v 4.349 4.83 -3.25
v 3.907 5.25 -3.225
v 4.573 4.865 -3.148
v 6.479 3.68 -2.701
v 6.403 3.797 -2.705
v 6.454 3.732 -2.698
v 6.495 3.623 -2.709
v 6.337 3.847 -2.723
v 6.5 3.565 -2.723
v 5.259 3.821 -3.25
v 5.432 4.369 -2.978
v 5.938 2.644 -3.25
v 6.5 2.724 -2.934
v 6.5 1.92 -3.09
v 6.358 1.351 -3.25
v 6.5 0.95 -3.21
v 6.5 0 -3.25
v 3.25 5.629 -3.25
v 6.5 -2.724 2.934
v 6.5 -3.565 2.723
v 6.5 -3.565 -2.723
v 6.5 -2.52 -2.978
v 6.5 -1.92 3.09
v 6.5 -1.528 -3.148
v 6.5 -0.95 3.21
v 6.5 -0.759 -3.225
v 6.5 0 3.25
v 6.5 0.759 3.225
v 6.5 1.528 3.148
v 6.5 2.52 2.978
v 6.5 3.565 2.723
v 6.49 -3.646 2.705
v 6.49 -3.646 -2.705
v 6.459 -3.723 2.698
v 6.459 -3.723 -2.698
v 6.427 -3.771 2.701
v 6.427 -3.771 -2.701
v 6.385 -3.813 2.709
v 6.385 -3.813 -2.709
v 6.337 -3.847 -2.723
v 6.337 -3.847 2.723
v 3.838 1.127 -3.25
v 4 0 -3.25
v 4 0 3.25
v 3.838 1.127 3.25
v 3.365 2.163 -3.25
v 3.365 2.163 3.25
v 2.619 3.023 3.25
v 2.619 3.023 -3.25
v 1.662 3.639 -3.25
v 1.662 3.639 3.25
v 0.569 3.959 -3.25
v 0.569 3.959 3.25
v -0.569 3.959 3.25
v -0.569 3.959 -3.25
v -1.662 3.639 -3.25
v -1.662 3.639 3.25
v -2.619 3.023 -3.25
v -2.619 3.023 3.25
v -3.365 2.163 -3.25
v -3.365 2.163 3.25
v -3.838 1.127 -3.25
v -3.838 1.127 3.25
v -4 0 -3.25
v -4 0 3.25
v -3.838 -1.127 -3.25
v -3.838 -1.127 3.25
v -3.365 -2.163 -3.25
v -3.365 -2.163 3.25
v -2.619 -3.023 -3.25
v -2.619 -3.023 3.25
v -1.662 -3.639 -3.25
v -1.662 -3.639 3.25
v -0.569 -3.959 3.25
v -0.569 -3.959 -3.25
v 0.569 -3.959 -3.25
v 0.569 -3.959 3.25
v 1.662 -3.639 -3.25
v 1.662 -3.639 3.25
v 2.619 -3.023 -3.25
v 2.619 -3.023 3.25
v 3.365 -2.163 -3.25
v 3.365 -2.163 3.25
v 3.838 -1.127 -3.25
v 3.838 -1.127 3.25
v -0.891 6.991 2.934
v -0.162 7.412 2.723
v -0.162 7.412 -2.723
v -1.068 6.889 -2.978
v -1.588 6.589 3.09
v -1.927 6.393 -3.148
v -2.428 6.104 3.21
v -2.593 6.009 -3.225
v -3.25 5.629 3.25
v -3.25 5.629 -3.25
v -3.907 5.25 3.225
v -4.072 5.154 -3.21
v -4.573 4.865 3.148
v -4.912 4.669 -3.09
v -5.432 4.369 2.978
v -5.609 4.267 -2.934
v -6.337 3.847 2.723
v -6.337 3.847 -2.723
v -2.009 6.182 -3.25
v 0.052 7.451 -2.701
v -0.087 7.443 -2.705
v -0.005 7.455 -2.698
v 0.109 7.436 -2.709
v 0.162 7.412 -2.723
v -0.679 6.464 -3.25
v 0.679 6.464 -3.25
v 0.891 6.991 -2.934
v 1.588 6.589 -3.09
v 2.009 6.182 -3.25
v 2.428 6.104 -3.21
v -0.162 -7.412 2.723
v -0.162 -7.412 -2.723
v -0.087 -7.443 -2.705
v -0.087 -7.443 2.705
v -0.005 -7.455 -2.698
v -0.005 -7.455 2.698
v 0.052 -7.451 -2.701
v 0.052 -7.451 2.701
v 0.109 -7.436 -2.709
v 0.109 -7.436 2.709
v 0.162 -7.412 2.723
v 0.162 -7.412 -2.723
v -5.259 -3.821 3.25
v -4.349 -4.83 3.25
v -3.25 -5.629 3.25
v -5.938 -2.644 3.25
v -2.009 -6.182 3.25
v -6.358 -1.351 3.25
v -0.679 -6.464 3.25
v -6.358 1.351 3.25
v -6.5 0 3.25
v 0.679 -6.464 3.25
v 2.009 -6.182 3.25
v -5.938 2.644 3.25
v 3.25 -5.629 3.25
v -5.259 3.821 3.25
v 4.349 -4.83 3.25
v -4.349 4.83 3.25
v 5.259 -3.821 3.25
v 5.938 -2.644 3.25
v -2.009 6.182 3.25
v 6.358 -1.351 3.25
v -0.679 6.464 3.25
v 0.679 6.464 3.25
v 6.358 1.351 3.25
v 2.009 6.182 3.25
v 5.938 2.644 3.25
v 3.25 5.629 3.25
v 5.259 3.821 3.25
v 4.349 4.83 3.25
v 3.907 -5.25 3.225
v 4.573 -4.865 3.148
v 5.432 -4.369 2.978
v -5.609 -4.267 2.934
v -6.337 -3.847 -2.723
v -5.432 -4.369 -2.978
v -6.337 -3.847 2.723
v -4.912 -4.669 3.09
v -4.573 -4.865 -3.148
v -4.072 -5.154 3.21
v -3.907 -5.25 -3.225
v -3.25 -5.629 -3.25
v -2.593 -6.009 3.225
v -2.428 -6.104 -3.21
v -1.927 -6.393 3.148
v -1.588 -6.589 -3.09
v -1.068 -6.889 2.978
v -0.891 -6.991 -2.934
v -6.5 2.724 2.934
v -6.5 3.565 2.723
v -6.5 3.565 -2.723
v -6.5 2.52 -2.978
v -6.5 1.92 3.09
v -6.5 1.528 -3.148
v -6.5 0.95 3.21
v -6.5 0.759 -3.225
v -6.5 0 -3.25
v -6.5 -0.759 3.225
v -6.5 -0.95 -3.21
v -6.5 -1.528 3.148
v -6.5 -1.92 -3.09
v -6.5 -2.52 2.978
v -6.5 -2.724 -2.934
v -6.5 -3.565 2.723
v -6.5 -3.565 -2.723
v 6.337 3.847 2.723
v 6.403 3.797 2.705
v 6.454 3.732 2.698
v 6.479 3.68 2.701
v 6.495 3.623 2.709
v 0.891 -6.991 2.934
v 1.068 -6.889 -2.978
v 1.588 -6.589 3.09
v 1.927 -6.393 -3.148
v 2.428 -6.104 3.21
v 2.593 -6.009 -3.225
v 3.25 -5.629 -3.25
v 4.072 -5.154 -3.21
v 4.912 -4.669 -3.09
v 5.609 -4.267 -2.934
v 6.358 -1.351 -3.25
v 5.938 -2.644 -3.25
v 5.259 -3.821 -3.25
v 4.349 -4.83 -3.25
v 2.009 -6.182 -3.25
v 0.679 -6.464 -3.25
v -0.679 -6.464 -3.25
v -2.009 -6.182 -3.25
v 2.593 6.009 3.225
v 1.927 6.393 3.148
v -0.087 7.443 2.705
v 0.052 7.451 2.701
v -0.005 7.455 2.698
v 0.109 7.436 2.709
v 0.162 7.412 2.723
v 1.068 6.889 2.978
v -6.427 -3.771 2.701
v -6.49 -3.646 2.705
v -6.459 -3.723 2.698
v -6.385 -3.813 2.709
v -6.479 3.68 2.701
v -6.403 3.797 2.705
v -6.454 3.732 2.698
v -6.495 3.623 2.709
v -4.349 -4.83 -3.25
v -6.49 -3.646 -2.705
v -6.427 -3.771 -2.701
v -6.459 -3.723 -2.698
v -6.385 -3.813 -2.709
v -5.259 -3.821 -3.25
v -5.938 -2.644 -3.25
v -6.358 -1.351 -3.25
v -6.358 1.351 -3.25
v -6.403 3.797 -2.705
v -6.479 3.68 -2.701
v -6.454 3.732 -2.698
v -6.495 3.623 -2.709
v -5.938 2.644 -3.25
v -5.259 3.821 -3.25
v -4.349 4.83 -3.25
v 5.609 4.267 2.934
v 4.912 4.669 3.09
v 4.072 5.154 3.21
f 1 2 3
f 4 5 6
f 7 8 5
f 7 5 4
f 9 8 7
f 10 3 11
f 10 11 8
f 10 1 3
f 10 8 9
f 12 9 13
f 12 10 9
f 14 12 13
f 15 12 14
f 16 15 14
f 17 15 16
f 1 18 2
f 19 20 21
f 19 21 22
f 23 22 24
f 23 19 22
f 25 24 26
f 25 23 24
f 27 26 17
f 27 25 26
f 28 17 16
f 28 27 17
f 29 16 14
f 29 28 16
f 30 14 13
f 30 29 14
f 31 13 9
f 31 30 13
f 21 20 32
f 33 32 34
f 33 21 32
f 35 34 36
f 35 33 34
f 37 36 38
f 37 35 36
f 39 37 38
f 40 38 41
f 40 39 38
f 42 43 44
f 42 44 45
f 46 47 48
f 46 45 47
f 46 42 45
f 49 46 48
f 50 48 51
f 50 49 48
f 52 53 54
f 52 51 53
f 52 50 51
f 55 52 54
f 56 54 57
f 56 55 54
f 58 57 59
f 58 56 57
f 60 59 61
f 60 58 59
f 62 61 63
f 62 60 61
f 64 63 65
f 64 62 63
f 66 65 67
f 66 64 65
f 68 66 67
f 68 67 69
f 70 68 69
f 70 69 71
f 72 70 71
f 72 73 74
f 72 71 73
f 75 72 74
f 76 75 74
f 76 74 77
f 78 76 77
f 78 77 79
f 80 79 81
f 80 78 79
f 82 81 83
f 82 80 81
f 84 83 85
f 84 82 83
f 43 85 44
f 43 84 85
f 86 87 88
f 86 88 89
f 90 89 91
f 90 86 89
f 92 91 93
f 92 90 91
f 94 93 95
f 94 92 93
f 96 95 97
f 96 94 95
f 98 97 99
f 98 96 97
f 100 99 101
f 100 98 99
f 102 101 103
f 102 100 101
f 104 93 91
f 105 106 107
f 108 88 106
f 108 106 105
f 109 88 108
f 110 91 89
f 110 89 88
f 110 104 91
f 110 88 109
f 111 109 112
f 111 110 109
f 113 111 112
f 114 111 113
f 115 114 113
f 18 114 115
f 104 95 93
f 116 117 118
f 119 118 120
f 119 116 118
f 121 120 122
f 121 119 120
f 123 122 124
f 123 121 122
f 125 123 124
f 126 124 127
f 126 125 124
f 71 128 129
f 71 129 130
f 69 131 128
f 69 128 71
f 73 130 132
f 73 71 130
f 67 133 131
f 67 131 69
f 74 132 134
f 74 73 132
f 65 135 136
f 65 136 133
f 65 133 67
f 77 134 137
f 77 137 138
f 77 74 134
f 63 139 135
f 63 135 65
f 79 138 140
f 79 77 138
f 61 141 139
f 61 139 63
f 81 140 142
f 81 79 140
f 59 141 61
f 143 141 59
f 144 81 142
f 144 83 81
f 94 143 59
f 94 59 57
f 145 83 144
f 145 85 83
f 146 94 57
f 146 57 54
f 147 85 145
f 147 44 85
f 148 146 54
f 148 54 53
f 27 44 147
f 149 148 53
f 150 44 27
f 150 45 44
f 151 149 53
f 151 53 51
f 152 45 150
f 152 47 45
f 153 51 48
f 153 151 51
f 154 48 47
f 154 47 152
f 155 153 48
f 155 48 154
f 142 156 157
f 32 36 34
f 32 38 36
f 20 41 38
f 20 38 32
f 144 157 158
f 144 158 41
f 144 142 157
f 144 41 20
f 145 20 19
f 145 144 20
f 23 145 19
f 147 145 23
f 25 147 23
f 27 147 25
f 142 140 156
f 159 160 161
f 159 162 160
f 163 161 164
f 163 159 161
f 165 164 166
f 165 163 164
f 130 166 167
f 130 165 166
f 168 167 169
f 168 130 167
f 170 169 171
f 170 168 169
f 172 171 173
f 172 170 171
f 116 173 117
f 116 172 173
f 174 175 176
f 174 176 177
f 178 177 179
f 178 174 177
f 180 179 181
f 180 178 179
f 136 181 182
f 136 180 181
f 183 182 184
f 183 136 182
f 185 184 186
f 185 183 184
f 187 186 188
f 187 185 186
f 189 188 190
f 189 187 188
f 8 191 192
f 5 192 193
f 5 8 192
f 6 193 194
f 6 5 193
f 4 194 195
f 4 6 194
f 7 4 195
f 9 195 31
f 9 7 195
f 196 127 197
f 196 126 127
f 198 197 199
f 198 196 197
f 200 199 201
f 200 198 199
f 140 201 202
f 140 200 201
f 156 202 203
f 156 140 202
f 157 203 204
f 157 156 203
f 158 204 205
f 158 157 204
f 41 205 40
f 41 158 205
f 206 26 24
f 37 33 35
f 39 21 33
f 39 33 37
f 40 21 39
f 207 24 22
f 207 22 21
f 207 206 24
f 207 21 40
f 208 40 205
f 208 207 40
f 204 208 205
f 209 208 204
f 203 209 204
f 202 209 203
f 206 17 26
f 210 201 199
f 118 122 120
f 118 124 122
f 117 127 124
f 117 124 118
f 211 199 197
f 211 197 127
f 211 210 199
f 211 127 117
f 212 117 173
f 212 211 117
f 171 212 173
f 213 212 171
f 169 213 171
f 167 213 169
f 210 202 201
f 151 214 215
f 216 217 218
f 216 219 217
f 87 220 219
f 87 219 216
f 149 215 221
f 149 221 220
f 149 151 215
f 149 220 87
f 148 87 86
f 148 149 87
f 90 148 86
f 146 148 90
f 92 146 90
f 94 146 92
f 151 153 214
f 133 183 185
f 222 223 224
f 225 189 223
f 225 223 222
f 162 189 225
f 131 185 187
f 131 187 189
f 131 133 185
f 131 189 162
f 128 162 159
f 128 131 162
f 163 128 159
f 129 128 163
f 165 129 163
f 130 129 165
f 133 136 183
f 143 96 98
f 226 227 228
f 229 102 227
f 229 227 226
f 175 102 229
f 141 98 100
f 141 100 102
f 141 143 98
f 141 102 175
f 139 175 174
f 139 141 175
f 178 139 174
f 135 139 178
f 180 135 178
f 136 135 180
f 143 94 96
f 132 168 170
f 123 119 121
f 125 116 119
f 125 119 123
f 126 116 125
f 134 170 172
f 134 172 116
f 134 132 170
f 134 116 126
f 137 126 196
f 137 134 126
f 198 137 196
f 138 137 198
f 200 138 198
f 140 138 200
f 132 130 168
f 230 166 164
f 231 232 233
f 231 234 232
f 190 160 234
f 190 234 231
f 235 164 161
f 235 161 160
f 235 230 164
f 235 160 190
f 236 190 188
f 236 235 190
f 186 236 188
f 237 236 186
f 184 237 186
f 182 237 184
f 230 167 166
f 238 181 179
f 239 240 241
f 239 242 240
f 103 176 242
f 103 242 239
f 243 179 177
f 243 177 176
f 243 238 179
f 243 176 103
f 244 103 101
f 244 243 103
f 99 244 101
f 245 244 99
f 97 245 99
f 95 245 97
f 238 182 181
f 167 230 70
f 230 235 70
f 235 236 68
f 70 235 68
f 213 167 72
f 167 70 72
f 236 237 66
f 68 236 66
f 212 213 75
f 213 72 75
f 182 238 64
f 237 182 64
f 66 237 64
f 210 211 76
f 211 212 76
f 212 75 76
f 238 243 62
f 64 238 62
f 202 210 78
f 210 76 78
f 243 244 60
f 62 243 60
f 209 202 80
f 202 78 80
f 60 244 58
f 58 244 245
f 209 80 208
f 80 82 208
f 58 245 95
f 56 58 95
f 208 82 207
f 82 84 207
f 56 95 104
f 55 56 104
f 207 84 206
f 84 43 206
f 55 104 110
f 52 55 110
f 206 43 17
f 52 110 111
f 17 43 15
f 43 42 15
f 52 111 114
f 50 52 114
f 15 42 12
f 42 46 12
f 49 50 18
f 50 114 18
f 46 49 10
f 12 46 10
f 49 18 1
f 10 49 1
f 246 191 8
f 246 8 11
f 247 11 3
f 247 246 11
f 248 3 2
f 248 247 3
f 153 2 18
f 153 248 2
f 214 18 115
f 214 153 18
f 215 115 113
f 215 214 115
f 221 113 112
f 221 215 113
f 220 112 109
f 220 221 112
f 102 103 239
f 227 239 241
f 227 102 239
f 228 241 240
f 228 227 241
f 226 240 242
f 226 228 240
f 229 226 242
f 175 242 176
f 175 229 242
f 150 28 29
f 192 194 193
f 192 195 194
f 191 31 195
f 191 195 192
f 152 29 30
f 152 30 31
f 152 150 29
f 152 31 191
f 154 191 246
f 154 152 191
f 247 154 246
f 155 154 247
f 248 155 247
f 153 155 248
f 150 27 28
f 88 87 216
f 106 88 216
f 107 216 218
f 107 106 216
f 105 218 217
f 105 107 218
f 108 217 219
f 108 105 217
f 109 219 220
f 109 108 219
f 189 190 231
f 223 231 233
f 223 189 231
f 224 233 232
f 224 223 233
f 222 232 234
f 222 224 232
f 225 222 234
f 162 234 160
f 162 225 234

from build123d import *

# Parameters (mm, degrees)
BOSS_EXTRUDE2_DEPTH     = 3.25
CUT_EXTRUDE4_DEPTH      = 11.447288324
CUT_EXTRUDE4_DEPTH_BACK = 11.447288324
SKETCH16_R              = 4
SKETCH7_OUTSIDE_W       = 63.752
SKETCH7_OUTSIDE_H       = 65.764
SKETCH7_OUTSIDE_R       = 6.5
CUT_EXTRUDE5_DEPTH      = 12.867322079
CUT_EXTRUDE5_DRAFT      = -60
MIRROR4_COPY_1_SKETCH_W = 63.752
MIRROR4_COPY_1_SKETCH_H = 65.764
MIRROR4_COPY_1_SKETCH_R = 6.5
MIRROR4_COPY_1_DEPTH    = 12.867322079
MIRROR4_COPY_1_DRAFT    = -60
FILLET2_R               = 0.325


with BuildPart() as part:
    # Sketch15 → Boss-Extrude2 (new, symmetric)
    with BuildSketch(Plane.XY):
        Polygon((0, 7.505553499), (-6.5, 3.75277675), (-6.5, -3.75277675), (0, -7.505553499), (6.5, -3.75277675), (6.5, 3.75277675), align=None)
    extrude(amount=BOSS_EXTRUDE2_DEPTH, both=True)

    # Sketch16 → Cut-Extrude4 (cut, two sides: drawn at the far end of the back side and taken through both)
    with BuildSketch(Plane.XY.offset(-CUT_EXTRUDE4_DEPTH_BACK)):
        Circle(SKETCH16_R)
    extrude(amount=CUT_EXTRUDE4_DEPTH + CUT_EXTRUDE4_DEPTH_BACK, mode=Mode.SUBTRACT)


with BuildPart() as cut_extrude5_tool:
    # Sketch7 outside → Cut-Extrude5 (with draft: the straight prism first)
    with BuildSketch(Plane.XY.offset(3.25)):
        Rectangle(SKETCH7_OUTSIDE_W, SKETCH7_OUTSIDE_H)
        Circle(SKETCH7_OUTSIDE_R, mode=Mode.SUBTRACT)
    extrude(amount=-CUT_EXTRUDE5_DEPTH)
    # Cut-Extrude5: the draft: its side faces are tilted about the plane it starts from
    cut_extrude5_sides = [cut_extrude5_tool.faces().sort_by_distance(p)[0] for p in [
        (0, -32.882, -3.18366104),
        (31.876, 0, -3.18366104),
        (0, 32.882, -3.18366104),
        (-31.876, 0, -3.18366104),
        (-6.5, 0, -3.18366104),
    ]]
    draft(cut_extrude5_sides, Plane.XY.offset(3.25), CUT_EXTRUDE5_DRAFT)


with BuildPart() as part_1:
    add(part.part)

    # Cut-Extrude5: cut by cut_extrude5_tool
    add(cut_extrude5_tool.part, mode=Mode.SUBTRACT)


with BuildPart() as mirror4_copy_1_tool:
    # Mirror4 copy 1 sketch → Mirror4 copy 1 (with draft: the straight prism first)
    with BuildSketch(Plane(origin=(0, 0, -3.25), x_dir=(1, 0, 0), z_dir=(0, 0, -1))):
        Rectangle(MIRROR4_COPY_1_SKETCH_W, MIRROR4_COPY_1_SKETCH_H)
        Circle(MIRROR4_COPY_1_SKETCH_R, mode=Mode.SUBTRACT)
    extrude(amount=-MIRROR4_COPY_1_DEPTH)
    # Mirror4 copy 1: the draft: its side faces are tilted about the plane it starts from
    mirror4_copy_1_sides = [mirror4_copy_1_tool.faces().sort_by_distance(p)[0] for p in [
        (0, -32.882, 3.18366104),
        (31.876, 0, 3.18366104),
        (0, 32.882, 3.18366104),
        (-31.876, 0, 3.18366104),
        (-6.5, 0, 3.18366104),
    ]]
    draft(mirror4_copy_1_sides, Plane(origin=(0, 0, -3.25), x_dir=(1, 0, 0), z_dir=(0, 0, -1)), MIRROR4_COPY_1_DRAFT)


with BuildPart() as part_2:
    add(part_1.part)

    # Mirror4 copy 1: cut by mirror4_copy_1_tool
    add(mirror4_copy_1_tool.part, mode=Mode.SUBTRACT)

    # Fillet2
    fillet2_edges = [part_2.edges().sort_by_distance(p)[0] for p in [
        (-6.5, 3.75277675, 0),
        (-6.5, -3.75277675, 0),
        (0, -7.505553499, 0),
        (6.5, -3.75277675, 0),
        (6.5, 3.75277675, 0),
        (0, 7.505553499, 0),
    ]]
    fillet(fillet2_edges, radius=FILLET2_R)


solid = part_2.part
